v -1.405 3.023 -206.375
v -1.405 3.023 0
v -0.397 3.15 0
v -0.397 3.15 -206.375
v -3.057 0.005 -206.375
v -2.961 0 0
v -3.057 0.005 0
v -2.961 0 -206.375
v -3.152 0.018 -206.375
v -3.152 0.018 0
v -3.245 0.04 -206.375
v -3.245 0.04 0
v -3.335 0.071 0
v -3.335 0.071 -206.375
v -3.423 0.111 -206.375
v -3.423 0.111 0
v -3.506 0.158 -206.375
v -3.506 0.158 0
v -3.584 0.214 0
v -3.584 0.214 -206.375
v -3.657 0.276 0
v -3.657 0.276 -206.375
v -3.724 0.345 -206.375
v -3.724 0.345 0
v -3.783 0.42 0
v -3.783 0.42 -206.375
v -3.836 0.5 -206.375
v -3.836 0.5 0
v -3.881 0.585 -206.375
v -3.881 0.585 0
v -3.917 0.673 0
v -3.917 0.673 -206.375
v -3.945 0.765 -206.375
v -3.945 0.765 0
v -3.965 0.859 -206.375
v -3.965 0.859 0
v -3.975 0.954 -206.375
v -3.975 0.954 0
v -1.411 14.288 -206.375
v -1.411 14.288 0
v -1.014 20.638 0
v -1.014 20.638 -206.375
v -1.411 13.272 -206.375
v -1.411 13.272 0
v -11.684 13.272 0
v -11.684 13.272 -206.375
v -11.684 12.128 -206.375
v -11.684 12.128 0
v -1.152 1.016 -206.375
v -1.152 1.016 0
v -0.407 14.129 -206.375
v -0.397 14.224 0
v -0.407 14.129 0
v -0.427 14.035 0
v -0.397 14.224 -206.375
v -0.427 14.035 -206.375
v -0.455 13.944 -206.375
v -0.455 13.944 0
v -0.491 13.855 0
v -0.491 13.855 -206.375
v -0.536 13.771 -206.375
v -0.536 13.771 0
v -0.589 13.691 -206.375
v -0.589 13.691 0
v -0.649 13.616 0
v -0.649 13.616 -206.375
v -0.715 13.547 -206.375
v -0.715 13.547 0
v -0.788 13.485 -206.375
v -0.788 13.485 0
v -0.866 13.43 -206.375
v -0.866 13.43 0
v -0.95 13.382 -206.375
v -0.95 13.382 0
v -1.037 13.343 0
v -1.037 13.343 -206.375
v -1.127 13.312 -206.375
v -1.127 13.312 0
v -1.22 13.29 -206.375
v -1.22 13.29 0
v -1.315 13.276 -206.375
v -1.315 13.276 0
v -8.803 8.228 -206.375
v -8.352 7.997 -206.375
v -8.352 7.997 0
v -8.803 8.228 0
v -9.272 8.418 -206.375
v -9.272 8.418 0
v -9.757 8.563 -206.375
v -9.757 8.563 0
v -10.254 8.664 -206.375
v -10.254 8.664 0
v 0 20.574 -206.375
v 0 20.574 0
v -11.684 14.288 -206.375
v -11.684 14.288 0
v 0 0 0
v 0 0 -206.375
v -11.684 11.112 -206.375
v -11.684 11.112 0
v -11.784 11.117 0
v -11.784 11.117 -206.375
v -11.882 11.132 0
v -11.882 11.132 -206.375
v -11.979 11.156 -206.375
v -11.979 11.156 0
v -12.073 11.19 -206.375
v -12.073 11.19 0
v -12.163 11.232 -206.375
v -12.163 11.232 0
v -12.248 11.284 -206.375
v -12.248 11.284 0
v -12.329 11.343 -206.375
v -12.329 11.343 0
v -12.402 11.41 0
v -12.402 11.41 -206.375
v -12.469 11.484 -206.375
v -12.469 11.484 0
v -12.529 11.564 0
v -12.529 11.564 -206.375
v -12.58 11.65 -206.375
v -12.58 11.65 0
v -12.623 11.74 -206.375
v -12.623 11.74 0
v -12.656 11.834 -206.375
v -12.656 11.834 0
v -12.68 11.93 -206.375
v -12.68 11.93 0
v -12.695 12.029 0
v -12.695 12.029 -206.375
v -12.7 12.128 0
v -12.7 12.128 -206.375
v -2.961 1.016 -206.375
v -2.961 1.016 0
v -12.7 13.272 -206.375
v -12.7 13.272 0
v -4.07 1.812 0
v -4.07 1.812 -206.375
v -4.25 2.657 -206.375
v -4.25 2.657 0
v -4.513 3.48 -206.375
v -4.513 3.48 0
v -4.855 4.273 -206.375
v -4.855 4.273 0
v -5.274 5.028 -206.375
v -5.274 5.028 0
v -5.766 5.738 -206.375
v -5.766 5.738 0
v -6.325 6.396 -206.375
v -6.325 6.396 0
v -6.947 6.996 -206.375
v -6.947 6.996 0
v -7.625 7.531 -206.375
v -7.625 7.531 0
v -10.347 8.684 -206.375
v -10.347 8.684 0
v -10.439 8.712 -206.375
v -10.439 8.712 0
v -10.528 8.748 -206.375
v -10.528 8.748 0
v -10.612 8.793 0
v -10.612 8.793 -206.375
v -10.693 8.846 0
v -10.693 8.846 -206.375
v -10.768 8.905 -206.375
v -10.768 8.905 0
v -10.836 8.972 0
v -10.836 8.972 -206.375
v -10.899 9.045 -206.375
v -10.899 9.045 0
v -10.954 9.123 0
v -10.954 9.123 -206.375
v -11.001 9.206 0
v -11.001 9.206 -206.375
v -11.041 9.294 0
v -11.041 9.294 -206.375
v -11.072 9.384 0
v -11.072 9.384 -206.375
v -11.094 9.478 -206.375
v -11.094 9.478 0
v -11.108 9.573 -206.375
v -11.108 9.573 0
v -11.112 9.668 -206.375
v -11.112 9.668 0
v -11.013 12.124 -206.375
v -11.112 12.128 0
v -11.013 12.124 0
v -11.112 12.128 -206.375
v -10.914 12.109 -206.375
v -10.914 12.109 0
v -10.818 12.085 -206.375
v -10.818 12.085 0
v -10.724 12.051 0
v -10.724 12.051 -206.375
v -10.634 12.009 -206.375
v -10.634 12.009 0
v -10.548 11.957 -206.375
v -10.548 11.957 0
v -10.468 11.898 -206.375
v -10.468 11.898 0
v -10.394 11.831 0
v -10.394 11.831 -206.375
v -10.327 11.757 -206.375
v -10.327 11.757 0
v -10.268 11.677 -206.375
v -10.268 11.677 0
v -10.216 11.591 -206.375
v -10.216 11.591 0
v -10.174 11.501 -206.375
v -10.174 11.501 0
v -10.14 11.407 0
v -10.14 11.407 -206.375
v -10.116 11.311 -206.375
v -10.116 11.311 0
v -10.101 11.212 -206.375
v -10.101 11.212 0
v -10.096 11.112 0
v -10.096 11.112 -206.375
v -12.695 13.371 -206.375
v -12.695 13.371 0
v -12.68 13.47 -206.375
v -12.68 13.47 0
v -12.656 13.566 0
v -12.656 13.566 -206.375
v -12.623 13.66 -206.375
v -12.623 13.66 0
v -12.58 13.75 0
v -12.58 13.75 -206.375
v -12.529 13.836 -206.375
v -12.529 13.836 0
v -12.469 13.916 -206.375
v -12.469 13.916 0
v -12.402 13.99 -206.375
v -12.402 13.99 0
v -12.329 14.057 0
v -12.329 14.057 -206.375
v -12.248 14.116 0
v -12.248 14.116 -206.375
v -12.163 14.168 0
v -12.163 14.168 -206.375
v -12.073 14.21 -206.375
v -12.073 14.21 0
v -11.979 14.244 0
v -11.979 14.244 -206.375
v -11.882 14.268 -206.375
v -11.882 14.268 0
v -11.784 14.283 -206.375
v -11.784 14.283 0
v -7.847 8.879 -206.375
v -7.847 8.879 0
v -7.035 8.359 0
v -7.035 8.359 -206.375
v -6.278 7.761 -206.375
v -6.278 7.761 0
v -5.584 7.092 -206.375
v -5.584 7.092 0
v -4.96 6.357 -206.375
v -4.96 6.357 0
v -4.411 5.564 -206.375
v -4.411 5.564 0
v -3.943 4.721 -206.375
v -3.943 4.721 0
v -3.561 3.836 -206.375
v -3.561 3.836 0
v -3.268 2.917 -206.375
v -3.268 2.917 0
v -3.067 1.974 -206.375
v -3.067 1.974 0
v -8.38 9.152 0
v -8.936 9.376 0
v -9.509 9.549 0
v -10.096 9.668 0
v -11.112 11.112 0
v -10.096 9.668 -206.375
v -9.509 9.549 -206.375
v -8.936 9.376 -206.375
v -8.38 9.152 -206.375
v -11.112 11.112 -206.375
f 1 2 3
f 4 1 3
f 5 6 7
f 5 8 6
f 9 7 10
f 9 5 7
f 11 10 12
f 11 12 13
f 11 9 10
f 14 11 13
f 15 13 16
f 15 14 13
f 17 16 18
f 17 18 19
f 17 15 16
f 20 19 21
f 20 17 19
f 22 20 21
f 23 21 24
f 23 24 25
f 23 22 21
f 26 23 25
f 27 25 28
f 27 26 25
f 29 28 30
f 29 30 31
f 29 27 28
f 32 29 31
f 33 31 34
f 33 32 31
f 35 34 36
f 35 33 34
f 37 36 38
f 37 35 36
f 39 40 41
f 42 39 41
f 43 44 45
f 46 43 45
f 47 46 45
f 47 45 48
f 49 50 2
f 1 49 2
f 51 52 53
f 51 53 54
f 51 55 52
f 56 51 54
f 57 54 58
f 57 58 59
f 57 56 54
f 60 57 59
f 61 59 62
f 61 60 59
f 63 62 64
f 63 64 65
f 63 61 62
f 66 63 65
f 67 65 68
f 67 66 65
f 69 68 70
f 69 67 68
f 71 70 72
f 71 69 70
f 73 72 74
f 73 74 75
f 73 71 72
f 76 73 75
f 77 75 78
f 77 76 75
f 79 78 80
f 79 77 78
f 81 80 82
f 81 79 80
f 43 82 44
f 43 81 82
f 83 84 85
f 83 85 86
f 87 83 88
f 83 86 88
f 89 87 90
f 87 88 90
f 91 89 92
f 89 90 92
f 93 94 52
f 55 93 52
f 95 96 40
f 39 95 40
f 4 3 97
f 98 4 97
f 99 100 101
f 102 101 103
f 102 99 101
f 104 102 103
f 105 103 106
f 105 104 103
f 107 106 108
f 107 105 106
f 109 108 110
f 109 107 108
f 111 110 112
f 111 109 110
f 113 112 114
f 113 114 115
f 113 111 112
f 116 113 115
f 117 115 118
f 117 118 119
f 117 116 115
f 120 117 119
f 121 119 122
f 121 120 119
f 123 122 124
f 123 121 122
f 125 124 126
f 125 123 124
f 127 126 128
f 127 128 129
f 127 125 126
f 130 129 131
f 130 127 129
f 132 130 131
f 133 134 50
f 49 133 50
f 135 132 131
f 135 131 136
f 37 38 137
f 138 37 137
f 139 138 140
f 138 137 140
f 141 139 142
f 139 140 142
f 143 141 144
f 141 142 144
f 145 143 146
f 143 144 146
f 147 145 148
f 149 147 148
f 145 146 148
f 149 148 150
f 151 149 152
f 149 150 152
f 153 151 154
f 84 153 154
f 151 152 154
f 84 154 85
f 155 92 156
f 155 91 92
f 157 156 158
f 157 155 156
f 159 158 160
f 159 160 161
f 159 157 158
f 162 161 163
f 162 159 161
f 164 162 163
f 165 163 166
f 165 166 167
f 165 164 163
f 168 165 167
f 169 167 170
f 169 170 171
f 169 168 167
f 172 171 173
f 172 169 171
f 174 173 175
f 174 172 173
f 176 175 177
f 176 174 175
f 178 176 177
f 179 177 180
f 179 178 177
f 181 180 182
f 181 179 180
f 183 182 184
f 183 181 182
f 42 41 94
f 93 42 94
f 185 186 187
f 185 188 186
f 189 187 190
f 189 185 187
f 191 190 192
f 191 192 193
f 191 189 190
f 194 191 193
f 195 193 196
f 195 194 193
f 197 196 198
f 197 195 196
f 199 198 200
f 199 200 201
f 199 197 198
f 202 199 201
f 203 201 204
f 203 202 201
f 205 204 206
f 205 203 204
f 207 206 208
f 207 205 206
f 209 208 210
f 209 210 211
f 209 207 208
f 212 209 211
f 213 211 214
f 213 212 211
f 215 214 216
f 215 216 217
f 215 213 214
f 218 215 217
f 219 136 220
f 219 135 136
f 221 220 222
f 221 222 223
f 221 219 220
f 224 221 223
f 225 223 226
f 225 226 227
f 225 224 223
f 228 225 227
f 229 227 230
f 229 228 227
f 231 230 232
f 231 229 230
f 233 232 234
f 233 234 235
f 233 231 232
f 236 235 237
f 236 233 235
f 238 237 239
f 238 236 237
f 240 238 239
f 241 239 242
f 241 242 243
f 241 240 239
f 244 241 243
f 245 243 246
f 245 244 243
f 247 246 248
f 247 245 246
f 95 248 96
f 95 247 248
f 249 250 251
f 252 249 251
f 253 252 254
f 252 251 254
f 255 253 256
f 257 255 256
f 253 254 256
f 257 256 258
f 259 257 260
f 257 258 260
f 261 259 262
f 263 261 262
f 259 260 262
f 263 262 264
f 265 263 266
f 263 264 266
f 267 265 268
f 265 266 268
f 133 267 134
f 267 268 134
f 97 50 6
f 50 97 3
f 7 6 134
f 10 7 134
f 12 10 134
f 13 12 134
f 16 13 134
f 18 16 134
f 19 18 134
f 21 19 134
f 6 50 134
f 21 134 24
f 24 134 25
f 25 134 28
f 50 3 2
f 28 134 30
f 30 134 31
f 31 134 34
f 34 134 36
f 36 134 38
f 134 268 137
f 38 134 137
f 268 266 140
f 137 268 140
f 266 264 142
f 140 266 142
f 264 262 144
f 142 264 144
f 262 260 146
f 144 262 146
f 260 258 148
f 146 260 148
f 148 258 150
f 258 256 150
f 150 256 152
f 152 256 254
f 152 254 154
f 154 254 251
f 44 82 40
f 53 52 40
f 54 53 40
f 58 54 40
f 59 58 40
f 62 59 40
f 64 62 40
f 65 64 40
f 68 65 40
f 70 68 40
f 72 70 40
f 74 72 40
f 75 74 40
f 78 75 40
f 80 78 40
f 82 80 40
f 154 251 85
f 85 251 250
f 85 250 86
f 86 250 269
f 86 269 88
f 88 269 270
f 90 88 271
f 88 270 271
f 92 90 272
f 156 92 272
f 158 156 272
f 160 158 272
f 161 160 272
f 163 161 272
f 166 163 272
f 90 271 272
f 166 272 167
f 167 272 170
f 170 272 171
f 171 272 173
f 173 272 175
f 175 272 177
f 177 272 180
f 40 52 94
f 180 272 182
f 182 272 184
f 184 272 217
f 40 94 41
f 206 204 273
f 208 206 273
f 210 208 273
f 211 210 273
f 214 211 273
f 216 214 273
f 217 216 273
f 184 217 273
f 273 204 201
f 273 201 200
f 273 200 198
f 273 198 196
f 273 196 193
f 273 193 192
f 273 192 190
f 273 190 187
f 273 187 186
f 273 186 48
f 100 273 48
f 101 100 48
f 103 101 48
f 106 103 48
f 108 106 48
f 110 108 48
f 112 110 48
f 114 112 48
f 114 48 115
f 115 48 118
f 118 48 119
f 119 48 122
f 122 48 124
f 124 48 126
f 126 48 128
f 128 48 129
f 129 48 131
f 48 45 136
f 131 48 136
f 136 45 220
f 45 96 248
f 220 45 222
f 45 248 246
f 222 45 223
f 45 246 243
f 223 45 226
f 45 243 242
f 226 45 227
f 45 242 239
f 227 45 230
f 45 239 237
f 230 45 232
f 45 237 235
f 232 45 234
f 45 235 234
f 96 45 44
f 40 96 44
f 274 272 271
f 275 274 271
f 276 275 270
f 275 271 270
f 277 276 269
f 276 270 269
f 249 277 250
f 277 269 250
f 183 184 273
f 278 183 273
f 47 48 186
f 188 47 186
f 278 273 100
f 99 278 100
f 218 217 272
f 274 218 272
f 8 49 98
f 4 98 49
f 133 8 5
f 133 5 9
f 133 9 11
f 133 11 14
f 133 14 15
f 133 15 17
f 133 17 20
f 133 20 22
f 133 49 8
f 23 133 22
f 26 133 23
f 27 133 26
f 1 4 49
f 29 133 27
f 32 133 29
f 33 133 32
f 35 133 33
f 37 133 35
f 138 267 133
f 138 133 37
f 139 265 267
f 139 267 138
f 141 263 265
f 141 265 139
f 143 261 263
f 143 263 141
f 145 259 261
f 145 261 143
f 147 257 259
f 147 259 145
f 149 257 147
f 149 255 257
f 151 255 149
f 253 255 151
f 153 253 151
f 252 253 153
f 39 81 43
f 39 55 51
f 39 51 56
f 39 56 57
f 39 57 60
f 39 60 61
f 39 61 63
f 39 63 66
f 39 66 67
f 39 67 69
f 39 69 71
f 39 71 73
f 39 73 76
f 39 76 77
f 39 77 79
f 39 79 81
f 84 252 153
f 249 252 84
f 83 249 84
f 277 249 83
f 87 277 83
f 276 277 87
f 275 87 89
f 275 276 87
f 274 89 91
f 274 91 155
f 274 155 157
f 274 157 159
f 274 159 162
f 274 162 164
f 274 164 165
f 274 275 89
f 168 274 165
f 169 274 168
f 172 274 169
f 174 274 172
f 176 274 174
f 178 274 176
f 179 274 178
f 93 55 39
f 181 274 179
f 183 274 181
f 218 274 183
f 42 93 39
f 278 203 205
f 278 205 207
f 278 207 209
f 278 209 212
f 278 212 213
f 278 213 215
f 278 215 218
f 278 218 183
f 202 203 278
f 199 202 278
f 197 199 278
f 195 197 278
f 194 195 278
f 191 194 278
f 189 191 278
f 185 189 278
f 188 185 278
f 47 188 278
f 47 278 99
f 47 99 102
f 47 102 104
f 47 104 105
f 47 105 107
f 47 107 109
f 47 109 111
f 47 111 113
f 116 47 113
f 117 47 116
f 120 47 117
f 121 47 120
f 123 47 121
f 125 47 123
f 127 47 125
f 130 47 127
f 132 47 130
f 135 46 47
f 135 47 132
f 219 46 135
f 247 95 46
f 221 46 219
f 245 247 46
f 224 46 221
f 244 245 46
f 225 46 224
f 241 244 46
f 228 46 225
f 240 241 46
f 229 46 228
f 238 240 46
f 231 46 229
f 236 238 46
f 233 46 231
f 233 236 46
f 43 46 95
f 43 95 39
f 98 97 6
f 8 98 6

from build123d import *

# Parameters (mm, degrees)
EXTRUDE_THIN1_DEPTH = 206.375
FILLET1_R           = 1.016


with BuildPart() as part:
    # Sketch1 → Extrude-Thin1 (new body)
    with BuildSketch(Plane.XY):
        with BuildLine():
            Line((-0.396875, 3.150097655), (0, 0))
            Line((0, 0), (-3.96875, 0))
            ThreePointArc((-3.96875, 0), (-5.03336677, 4.616238484), (-8.352026926, 7.997001915))
            ThreePointArc((-8.352026926, 7.997001915), (-9.684272791, 8.544551294), (-11.1125, 8.73125))
            Line((-11.1125, 8.73125), (-11.1125, 11.1125))
            Line((-11.1125, 11.1125), (-12.7, 11.1125))
            Line((-12.7, 11.1125), (-12.7, 14.2875))
            Line((-12.7, 14.2875), (-1.41089642, 14.2875))
            Line((-1.41089642, 14.2875), (-1.01402142, 20.6375))
            Line((-1.01402142, 20.6375), (0, 20.574123661))
            Line((0, 20.574123661), (-0.456413979, 13.2715))
            Line((-0.456413979, 13.2715), (-11.684, 13.2715))
            Line((-11.684, 13.2715), (-11.684, 12.1285))
            Line((-11.684, 12.1285), (-10.0965, 12.1285))
            Line((-10.0965, 12.1285), (-10.0965, 9.668243724))
            ThreePointArc((-10.0965, 9.668243724), (-8.935783532, 9.376320463), (-7.847254707, 8.878739409))
            ThreePointArc((-7.847254707, 8.878739409), (-4.411092734, 5.564472131), (-2.960927924, 1.016))
            Line((-2.960927924, 1.016), (-1.152035714, 1.016))
            Line((-1.152035714, 1.016), (-1.40490625, 3.023097655))
            Line((-1.40490625, 3.023097655), (-0.396875, 3.150097655))
        make_face()
    extrude(amount=-EXTRUDE_THIN1_DEPTH)

    # Fillet1
    fillet1_edges = [part.edges().sort_by_distance(p)[0] for p in [
        (-0.456413979, 13.2715, -103.1875),
        (-10.0965, 12.1285, -103.1875),
        (-3.96875, 0, -103.1875),
        (-11.1125, 8.73125, -103.1875),
        (-12.7, 11.1125, -103.1875),
        (-12.7, 14.2875, -103.1875),
    ]]
    fillet(fillet1_edges, radius=FILLET1_R)


solid = part.part
